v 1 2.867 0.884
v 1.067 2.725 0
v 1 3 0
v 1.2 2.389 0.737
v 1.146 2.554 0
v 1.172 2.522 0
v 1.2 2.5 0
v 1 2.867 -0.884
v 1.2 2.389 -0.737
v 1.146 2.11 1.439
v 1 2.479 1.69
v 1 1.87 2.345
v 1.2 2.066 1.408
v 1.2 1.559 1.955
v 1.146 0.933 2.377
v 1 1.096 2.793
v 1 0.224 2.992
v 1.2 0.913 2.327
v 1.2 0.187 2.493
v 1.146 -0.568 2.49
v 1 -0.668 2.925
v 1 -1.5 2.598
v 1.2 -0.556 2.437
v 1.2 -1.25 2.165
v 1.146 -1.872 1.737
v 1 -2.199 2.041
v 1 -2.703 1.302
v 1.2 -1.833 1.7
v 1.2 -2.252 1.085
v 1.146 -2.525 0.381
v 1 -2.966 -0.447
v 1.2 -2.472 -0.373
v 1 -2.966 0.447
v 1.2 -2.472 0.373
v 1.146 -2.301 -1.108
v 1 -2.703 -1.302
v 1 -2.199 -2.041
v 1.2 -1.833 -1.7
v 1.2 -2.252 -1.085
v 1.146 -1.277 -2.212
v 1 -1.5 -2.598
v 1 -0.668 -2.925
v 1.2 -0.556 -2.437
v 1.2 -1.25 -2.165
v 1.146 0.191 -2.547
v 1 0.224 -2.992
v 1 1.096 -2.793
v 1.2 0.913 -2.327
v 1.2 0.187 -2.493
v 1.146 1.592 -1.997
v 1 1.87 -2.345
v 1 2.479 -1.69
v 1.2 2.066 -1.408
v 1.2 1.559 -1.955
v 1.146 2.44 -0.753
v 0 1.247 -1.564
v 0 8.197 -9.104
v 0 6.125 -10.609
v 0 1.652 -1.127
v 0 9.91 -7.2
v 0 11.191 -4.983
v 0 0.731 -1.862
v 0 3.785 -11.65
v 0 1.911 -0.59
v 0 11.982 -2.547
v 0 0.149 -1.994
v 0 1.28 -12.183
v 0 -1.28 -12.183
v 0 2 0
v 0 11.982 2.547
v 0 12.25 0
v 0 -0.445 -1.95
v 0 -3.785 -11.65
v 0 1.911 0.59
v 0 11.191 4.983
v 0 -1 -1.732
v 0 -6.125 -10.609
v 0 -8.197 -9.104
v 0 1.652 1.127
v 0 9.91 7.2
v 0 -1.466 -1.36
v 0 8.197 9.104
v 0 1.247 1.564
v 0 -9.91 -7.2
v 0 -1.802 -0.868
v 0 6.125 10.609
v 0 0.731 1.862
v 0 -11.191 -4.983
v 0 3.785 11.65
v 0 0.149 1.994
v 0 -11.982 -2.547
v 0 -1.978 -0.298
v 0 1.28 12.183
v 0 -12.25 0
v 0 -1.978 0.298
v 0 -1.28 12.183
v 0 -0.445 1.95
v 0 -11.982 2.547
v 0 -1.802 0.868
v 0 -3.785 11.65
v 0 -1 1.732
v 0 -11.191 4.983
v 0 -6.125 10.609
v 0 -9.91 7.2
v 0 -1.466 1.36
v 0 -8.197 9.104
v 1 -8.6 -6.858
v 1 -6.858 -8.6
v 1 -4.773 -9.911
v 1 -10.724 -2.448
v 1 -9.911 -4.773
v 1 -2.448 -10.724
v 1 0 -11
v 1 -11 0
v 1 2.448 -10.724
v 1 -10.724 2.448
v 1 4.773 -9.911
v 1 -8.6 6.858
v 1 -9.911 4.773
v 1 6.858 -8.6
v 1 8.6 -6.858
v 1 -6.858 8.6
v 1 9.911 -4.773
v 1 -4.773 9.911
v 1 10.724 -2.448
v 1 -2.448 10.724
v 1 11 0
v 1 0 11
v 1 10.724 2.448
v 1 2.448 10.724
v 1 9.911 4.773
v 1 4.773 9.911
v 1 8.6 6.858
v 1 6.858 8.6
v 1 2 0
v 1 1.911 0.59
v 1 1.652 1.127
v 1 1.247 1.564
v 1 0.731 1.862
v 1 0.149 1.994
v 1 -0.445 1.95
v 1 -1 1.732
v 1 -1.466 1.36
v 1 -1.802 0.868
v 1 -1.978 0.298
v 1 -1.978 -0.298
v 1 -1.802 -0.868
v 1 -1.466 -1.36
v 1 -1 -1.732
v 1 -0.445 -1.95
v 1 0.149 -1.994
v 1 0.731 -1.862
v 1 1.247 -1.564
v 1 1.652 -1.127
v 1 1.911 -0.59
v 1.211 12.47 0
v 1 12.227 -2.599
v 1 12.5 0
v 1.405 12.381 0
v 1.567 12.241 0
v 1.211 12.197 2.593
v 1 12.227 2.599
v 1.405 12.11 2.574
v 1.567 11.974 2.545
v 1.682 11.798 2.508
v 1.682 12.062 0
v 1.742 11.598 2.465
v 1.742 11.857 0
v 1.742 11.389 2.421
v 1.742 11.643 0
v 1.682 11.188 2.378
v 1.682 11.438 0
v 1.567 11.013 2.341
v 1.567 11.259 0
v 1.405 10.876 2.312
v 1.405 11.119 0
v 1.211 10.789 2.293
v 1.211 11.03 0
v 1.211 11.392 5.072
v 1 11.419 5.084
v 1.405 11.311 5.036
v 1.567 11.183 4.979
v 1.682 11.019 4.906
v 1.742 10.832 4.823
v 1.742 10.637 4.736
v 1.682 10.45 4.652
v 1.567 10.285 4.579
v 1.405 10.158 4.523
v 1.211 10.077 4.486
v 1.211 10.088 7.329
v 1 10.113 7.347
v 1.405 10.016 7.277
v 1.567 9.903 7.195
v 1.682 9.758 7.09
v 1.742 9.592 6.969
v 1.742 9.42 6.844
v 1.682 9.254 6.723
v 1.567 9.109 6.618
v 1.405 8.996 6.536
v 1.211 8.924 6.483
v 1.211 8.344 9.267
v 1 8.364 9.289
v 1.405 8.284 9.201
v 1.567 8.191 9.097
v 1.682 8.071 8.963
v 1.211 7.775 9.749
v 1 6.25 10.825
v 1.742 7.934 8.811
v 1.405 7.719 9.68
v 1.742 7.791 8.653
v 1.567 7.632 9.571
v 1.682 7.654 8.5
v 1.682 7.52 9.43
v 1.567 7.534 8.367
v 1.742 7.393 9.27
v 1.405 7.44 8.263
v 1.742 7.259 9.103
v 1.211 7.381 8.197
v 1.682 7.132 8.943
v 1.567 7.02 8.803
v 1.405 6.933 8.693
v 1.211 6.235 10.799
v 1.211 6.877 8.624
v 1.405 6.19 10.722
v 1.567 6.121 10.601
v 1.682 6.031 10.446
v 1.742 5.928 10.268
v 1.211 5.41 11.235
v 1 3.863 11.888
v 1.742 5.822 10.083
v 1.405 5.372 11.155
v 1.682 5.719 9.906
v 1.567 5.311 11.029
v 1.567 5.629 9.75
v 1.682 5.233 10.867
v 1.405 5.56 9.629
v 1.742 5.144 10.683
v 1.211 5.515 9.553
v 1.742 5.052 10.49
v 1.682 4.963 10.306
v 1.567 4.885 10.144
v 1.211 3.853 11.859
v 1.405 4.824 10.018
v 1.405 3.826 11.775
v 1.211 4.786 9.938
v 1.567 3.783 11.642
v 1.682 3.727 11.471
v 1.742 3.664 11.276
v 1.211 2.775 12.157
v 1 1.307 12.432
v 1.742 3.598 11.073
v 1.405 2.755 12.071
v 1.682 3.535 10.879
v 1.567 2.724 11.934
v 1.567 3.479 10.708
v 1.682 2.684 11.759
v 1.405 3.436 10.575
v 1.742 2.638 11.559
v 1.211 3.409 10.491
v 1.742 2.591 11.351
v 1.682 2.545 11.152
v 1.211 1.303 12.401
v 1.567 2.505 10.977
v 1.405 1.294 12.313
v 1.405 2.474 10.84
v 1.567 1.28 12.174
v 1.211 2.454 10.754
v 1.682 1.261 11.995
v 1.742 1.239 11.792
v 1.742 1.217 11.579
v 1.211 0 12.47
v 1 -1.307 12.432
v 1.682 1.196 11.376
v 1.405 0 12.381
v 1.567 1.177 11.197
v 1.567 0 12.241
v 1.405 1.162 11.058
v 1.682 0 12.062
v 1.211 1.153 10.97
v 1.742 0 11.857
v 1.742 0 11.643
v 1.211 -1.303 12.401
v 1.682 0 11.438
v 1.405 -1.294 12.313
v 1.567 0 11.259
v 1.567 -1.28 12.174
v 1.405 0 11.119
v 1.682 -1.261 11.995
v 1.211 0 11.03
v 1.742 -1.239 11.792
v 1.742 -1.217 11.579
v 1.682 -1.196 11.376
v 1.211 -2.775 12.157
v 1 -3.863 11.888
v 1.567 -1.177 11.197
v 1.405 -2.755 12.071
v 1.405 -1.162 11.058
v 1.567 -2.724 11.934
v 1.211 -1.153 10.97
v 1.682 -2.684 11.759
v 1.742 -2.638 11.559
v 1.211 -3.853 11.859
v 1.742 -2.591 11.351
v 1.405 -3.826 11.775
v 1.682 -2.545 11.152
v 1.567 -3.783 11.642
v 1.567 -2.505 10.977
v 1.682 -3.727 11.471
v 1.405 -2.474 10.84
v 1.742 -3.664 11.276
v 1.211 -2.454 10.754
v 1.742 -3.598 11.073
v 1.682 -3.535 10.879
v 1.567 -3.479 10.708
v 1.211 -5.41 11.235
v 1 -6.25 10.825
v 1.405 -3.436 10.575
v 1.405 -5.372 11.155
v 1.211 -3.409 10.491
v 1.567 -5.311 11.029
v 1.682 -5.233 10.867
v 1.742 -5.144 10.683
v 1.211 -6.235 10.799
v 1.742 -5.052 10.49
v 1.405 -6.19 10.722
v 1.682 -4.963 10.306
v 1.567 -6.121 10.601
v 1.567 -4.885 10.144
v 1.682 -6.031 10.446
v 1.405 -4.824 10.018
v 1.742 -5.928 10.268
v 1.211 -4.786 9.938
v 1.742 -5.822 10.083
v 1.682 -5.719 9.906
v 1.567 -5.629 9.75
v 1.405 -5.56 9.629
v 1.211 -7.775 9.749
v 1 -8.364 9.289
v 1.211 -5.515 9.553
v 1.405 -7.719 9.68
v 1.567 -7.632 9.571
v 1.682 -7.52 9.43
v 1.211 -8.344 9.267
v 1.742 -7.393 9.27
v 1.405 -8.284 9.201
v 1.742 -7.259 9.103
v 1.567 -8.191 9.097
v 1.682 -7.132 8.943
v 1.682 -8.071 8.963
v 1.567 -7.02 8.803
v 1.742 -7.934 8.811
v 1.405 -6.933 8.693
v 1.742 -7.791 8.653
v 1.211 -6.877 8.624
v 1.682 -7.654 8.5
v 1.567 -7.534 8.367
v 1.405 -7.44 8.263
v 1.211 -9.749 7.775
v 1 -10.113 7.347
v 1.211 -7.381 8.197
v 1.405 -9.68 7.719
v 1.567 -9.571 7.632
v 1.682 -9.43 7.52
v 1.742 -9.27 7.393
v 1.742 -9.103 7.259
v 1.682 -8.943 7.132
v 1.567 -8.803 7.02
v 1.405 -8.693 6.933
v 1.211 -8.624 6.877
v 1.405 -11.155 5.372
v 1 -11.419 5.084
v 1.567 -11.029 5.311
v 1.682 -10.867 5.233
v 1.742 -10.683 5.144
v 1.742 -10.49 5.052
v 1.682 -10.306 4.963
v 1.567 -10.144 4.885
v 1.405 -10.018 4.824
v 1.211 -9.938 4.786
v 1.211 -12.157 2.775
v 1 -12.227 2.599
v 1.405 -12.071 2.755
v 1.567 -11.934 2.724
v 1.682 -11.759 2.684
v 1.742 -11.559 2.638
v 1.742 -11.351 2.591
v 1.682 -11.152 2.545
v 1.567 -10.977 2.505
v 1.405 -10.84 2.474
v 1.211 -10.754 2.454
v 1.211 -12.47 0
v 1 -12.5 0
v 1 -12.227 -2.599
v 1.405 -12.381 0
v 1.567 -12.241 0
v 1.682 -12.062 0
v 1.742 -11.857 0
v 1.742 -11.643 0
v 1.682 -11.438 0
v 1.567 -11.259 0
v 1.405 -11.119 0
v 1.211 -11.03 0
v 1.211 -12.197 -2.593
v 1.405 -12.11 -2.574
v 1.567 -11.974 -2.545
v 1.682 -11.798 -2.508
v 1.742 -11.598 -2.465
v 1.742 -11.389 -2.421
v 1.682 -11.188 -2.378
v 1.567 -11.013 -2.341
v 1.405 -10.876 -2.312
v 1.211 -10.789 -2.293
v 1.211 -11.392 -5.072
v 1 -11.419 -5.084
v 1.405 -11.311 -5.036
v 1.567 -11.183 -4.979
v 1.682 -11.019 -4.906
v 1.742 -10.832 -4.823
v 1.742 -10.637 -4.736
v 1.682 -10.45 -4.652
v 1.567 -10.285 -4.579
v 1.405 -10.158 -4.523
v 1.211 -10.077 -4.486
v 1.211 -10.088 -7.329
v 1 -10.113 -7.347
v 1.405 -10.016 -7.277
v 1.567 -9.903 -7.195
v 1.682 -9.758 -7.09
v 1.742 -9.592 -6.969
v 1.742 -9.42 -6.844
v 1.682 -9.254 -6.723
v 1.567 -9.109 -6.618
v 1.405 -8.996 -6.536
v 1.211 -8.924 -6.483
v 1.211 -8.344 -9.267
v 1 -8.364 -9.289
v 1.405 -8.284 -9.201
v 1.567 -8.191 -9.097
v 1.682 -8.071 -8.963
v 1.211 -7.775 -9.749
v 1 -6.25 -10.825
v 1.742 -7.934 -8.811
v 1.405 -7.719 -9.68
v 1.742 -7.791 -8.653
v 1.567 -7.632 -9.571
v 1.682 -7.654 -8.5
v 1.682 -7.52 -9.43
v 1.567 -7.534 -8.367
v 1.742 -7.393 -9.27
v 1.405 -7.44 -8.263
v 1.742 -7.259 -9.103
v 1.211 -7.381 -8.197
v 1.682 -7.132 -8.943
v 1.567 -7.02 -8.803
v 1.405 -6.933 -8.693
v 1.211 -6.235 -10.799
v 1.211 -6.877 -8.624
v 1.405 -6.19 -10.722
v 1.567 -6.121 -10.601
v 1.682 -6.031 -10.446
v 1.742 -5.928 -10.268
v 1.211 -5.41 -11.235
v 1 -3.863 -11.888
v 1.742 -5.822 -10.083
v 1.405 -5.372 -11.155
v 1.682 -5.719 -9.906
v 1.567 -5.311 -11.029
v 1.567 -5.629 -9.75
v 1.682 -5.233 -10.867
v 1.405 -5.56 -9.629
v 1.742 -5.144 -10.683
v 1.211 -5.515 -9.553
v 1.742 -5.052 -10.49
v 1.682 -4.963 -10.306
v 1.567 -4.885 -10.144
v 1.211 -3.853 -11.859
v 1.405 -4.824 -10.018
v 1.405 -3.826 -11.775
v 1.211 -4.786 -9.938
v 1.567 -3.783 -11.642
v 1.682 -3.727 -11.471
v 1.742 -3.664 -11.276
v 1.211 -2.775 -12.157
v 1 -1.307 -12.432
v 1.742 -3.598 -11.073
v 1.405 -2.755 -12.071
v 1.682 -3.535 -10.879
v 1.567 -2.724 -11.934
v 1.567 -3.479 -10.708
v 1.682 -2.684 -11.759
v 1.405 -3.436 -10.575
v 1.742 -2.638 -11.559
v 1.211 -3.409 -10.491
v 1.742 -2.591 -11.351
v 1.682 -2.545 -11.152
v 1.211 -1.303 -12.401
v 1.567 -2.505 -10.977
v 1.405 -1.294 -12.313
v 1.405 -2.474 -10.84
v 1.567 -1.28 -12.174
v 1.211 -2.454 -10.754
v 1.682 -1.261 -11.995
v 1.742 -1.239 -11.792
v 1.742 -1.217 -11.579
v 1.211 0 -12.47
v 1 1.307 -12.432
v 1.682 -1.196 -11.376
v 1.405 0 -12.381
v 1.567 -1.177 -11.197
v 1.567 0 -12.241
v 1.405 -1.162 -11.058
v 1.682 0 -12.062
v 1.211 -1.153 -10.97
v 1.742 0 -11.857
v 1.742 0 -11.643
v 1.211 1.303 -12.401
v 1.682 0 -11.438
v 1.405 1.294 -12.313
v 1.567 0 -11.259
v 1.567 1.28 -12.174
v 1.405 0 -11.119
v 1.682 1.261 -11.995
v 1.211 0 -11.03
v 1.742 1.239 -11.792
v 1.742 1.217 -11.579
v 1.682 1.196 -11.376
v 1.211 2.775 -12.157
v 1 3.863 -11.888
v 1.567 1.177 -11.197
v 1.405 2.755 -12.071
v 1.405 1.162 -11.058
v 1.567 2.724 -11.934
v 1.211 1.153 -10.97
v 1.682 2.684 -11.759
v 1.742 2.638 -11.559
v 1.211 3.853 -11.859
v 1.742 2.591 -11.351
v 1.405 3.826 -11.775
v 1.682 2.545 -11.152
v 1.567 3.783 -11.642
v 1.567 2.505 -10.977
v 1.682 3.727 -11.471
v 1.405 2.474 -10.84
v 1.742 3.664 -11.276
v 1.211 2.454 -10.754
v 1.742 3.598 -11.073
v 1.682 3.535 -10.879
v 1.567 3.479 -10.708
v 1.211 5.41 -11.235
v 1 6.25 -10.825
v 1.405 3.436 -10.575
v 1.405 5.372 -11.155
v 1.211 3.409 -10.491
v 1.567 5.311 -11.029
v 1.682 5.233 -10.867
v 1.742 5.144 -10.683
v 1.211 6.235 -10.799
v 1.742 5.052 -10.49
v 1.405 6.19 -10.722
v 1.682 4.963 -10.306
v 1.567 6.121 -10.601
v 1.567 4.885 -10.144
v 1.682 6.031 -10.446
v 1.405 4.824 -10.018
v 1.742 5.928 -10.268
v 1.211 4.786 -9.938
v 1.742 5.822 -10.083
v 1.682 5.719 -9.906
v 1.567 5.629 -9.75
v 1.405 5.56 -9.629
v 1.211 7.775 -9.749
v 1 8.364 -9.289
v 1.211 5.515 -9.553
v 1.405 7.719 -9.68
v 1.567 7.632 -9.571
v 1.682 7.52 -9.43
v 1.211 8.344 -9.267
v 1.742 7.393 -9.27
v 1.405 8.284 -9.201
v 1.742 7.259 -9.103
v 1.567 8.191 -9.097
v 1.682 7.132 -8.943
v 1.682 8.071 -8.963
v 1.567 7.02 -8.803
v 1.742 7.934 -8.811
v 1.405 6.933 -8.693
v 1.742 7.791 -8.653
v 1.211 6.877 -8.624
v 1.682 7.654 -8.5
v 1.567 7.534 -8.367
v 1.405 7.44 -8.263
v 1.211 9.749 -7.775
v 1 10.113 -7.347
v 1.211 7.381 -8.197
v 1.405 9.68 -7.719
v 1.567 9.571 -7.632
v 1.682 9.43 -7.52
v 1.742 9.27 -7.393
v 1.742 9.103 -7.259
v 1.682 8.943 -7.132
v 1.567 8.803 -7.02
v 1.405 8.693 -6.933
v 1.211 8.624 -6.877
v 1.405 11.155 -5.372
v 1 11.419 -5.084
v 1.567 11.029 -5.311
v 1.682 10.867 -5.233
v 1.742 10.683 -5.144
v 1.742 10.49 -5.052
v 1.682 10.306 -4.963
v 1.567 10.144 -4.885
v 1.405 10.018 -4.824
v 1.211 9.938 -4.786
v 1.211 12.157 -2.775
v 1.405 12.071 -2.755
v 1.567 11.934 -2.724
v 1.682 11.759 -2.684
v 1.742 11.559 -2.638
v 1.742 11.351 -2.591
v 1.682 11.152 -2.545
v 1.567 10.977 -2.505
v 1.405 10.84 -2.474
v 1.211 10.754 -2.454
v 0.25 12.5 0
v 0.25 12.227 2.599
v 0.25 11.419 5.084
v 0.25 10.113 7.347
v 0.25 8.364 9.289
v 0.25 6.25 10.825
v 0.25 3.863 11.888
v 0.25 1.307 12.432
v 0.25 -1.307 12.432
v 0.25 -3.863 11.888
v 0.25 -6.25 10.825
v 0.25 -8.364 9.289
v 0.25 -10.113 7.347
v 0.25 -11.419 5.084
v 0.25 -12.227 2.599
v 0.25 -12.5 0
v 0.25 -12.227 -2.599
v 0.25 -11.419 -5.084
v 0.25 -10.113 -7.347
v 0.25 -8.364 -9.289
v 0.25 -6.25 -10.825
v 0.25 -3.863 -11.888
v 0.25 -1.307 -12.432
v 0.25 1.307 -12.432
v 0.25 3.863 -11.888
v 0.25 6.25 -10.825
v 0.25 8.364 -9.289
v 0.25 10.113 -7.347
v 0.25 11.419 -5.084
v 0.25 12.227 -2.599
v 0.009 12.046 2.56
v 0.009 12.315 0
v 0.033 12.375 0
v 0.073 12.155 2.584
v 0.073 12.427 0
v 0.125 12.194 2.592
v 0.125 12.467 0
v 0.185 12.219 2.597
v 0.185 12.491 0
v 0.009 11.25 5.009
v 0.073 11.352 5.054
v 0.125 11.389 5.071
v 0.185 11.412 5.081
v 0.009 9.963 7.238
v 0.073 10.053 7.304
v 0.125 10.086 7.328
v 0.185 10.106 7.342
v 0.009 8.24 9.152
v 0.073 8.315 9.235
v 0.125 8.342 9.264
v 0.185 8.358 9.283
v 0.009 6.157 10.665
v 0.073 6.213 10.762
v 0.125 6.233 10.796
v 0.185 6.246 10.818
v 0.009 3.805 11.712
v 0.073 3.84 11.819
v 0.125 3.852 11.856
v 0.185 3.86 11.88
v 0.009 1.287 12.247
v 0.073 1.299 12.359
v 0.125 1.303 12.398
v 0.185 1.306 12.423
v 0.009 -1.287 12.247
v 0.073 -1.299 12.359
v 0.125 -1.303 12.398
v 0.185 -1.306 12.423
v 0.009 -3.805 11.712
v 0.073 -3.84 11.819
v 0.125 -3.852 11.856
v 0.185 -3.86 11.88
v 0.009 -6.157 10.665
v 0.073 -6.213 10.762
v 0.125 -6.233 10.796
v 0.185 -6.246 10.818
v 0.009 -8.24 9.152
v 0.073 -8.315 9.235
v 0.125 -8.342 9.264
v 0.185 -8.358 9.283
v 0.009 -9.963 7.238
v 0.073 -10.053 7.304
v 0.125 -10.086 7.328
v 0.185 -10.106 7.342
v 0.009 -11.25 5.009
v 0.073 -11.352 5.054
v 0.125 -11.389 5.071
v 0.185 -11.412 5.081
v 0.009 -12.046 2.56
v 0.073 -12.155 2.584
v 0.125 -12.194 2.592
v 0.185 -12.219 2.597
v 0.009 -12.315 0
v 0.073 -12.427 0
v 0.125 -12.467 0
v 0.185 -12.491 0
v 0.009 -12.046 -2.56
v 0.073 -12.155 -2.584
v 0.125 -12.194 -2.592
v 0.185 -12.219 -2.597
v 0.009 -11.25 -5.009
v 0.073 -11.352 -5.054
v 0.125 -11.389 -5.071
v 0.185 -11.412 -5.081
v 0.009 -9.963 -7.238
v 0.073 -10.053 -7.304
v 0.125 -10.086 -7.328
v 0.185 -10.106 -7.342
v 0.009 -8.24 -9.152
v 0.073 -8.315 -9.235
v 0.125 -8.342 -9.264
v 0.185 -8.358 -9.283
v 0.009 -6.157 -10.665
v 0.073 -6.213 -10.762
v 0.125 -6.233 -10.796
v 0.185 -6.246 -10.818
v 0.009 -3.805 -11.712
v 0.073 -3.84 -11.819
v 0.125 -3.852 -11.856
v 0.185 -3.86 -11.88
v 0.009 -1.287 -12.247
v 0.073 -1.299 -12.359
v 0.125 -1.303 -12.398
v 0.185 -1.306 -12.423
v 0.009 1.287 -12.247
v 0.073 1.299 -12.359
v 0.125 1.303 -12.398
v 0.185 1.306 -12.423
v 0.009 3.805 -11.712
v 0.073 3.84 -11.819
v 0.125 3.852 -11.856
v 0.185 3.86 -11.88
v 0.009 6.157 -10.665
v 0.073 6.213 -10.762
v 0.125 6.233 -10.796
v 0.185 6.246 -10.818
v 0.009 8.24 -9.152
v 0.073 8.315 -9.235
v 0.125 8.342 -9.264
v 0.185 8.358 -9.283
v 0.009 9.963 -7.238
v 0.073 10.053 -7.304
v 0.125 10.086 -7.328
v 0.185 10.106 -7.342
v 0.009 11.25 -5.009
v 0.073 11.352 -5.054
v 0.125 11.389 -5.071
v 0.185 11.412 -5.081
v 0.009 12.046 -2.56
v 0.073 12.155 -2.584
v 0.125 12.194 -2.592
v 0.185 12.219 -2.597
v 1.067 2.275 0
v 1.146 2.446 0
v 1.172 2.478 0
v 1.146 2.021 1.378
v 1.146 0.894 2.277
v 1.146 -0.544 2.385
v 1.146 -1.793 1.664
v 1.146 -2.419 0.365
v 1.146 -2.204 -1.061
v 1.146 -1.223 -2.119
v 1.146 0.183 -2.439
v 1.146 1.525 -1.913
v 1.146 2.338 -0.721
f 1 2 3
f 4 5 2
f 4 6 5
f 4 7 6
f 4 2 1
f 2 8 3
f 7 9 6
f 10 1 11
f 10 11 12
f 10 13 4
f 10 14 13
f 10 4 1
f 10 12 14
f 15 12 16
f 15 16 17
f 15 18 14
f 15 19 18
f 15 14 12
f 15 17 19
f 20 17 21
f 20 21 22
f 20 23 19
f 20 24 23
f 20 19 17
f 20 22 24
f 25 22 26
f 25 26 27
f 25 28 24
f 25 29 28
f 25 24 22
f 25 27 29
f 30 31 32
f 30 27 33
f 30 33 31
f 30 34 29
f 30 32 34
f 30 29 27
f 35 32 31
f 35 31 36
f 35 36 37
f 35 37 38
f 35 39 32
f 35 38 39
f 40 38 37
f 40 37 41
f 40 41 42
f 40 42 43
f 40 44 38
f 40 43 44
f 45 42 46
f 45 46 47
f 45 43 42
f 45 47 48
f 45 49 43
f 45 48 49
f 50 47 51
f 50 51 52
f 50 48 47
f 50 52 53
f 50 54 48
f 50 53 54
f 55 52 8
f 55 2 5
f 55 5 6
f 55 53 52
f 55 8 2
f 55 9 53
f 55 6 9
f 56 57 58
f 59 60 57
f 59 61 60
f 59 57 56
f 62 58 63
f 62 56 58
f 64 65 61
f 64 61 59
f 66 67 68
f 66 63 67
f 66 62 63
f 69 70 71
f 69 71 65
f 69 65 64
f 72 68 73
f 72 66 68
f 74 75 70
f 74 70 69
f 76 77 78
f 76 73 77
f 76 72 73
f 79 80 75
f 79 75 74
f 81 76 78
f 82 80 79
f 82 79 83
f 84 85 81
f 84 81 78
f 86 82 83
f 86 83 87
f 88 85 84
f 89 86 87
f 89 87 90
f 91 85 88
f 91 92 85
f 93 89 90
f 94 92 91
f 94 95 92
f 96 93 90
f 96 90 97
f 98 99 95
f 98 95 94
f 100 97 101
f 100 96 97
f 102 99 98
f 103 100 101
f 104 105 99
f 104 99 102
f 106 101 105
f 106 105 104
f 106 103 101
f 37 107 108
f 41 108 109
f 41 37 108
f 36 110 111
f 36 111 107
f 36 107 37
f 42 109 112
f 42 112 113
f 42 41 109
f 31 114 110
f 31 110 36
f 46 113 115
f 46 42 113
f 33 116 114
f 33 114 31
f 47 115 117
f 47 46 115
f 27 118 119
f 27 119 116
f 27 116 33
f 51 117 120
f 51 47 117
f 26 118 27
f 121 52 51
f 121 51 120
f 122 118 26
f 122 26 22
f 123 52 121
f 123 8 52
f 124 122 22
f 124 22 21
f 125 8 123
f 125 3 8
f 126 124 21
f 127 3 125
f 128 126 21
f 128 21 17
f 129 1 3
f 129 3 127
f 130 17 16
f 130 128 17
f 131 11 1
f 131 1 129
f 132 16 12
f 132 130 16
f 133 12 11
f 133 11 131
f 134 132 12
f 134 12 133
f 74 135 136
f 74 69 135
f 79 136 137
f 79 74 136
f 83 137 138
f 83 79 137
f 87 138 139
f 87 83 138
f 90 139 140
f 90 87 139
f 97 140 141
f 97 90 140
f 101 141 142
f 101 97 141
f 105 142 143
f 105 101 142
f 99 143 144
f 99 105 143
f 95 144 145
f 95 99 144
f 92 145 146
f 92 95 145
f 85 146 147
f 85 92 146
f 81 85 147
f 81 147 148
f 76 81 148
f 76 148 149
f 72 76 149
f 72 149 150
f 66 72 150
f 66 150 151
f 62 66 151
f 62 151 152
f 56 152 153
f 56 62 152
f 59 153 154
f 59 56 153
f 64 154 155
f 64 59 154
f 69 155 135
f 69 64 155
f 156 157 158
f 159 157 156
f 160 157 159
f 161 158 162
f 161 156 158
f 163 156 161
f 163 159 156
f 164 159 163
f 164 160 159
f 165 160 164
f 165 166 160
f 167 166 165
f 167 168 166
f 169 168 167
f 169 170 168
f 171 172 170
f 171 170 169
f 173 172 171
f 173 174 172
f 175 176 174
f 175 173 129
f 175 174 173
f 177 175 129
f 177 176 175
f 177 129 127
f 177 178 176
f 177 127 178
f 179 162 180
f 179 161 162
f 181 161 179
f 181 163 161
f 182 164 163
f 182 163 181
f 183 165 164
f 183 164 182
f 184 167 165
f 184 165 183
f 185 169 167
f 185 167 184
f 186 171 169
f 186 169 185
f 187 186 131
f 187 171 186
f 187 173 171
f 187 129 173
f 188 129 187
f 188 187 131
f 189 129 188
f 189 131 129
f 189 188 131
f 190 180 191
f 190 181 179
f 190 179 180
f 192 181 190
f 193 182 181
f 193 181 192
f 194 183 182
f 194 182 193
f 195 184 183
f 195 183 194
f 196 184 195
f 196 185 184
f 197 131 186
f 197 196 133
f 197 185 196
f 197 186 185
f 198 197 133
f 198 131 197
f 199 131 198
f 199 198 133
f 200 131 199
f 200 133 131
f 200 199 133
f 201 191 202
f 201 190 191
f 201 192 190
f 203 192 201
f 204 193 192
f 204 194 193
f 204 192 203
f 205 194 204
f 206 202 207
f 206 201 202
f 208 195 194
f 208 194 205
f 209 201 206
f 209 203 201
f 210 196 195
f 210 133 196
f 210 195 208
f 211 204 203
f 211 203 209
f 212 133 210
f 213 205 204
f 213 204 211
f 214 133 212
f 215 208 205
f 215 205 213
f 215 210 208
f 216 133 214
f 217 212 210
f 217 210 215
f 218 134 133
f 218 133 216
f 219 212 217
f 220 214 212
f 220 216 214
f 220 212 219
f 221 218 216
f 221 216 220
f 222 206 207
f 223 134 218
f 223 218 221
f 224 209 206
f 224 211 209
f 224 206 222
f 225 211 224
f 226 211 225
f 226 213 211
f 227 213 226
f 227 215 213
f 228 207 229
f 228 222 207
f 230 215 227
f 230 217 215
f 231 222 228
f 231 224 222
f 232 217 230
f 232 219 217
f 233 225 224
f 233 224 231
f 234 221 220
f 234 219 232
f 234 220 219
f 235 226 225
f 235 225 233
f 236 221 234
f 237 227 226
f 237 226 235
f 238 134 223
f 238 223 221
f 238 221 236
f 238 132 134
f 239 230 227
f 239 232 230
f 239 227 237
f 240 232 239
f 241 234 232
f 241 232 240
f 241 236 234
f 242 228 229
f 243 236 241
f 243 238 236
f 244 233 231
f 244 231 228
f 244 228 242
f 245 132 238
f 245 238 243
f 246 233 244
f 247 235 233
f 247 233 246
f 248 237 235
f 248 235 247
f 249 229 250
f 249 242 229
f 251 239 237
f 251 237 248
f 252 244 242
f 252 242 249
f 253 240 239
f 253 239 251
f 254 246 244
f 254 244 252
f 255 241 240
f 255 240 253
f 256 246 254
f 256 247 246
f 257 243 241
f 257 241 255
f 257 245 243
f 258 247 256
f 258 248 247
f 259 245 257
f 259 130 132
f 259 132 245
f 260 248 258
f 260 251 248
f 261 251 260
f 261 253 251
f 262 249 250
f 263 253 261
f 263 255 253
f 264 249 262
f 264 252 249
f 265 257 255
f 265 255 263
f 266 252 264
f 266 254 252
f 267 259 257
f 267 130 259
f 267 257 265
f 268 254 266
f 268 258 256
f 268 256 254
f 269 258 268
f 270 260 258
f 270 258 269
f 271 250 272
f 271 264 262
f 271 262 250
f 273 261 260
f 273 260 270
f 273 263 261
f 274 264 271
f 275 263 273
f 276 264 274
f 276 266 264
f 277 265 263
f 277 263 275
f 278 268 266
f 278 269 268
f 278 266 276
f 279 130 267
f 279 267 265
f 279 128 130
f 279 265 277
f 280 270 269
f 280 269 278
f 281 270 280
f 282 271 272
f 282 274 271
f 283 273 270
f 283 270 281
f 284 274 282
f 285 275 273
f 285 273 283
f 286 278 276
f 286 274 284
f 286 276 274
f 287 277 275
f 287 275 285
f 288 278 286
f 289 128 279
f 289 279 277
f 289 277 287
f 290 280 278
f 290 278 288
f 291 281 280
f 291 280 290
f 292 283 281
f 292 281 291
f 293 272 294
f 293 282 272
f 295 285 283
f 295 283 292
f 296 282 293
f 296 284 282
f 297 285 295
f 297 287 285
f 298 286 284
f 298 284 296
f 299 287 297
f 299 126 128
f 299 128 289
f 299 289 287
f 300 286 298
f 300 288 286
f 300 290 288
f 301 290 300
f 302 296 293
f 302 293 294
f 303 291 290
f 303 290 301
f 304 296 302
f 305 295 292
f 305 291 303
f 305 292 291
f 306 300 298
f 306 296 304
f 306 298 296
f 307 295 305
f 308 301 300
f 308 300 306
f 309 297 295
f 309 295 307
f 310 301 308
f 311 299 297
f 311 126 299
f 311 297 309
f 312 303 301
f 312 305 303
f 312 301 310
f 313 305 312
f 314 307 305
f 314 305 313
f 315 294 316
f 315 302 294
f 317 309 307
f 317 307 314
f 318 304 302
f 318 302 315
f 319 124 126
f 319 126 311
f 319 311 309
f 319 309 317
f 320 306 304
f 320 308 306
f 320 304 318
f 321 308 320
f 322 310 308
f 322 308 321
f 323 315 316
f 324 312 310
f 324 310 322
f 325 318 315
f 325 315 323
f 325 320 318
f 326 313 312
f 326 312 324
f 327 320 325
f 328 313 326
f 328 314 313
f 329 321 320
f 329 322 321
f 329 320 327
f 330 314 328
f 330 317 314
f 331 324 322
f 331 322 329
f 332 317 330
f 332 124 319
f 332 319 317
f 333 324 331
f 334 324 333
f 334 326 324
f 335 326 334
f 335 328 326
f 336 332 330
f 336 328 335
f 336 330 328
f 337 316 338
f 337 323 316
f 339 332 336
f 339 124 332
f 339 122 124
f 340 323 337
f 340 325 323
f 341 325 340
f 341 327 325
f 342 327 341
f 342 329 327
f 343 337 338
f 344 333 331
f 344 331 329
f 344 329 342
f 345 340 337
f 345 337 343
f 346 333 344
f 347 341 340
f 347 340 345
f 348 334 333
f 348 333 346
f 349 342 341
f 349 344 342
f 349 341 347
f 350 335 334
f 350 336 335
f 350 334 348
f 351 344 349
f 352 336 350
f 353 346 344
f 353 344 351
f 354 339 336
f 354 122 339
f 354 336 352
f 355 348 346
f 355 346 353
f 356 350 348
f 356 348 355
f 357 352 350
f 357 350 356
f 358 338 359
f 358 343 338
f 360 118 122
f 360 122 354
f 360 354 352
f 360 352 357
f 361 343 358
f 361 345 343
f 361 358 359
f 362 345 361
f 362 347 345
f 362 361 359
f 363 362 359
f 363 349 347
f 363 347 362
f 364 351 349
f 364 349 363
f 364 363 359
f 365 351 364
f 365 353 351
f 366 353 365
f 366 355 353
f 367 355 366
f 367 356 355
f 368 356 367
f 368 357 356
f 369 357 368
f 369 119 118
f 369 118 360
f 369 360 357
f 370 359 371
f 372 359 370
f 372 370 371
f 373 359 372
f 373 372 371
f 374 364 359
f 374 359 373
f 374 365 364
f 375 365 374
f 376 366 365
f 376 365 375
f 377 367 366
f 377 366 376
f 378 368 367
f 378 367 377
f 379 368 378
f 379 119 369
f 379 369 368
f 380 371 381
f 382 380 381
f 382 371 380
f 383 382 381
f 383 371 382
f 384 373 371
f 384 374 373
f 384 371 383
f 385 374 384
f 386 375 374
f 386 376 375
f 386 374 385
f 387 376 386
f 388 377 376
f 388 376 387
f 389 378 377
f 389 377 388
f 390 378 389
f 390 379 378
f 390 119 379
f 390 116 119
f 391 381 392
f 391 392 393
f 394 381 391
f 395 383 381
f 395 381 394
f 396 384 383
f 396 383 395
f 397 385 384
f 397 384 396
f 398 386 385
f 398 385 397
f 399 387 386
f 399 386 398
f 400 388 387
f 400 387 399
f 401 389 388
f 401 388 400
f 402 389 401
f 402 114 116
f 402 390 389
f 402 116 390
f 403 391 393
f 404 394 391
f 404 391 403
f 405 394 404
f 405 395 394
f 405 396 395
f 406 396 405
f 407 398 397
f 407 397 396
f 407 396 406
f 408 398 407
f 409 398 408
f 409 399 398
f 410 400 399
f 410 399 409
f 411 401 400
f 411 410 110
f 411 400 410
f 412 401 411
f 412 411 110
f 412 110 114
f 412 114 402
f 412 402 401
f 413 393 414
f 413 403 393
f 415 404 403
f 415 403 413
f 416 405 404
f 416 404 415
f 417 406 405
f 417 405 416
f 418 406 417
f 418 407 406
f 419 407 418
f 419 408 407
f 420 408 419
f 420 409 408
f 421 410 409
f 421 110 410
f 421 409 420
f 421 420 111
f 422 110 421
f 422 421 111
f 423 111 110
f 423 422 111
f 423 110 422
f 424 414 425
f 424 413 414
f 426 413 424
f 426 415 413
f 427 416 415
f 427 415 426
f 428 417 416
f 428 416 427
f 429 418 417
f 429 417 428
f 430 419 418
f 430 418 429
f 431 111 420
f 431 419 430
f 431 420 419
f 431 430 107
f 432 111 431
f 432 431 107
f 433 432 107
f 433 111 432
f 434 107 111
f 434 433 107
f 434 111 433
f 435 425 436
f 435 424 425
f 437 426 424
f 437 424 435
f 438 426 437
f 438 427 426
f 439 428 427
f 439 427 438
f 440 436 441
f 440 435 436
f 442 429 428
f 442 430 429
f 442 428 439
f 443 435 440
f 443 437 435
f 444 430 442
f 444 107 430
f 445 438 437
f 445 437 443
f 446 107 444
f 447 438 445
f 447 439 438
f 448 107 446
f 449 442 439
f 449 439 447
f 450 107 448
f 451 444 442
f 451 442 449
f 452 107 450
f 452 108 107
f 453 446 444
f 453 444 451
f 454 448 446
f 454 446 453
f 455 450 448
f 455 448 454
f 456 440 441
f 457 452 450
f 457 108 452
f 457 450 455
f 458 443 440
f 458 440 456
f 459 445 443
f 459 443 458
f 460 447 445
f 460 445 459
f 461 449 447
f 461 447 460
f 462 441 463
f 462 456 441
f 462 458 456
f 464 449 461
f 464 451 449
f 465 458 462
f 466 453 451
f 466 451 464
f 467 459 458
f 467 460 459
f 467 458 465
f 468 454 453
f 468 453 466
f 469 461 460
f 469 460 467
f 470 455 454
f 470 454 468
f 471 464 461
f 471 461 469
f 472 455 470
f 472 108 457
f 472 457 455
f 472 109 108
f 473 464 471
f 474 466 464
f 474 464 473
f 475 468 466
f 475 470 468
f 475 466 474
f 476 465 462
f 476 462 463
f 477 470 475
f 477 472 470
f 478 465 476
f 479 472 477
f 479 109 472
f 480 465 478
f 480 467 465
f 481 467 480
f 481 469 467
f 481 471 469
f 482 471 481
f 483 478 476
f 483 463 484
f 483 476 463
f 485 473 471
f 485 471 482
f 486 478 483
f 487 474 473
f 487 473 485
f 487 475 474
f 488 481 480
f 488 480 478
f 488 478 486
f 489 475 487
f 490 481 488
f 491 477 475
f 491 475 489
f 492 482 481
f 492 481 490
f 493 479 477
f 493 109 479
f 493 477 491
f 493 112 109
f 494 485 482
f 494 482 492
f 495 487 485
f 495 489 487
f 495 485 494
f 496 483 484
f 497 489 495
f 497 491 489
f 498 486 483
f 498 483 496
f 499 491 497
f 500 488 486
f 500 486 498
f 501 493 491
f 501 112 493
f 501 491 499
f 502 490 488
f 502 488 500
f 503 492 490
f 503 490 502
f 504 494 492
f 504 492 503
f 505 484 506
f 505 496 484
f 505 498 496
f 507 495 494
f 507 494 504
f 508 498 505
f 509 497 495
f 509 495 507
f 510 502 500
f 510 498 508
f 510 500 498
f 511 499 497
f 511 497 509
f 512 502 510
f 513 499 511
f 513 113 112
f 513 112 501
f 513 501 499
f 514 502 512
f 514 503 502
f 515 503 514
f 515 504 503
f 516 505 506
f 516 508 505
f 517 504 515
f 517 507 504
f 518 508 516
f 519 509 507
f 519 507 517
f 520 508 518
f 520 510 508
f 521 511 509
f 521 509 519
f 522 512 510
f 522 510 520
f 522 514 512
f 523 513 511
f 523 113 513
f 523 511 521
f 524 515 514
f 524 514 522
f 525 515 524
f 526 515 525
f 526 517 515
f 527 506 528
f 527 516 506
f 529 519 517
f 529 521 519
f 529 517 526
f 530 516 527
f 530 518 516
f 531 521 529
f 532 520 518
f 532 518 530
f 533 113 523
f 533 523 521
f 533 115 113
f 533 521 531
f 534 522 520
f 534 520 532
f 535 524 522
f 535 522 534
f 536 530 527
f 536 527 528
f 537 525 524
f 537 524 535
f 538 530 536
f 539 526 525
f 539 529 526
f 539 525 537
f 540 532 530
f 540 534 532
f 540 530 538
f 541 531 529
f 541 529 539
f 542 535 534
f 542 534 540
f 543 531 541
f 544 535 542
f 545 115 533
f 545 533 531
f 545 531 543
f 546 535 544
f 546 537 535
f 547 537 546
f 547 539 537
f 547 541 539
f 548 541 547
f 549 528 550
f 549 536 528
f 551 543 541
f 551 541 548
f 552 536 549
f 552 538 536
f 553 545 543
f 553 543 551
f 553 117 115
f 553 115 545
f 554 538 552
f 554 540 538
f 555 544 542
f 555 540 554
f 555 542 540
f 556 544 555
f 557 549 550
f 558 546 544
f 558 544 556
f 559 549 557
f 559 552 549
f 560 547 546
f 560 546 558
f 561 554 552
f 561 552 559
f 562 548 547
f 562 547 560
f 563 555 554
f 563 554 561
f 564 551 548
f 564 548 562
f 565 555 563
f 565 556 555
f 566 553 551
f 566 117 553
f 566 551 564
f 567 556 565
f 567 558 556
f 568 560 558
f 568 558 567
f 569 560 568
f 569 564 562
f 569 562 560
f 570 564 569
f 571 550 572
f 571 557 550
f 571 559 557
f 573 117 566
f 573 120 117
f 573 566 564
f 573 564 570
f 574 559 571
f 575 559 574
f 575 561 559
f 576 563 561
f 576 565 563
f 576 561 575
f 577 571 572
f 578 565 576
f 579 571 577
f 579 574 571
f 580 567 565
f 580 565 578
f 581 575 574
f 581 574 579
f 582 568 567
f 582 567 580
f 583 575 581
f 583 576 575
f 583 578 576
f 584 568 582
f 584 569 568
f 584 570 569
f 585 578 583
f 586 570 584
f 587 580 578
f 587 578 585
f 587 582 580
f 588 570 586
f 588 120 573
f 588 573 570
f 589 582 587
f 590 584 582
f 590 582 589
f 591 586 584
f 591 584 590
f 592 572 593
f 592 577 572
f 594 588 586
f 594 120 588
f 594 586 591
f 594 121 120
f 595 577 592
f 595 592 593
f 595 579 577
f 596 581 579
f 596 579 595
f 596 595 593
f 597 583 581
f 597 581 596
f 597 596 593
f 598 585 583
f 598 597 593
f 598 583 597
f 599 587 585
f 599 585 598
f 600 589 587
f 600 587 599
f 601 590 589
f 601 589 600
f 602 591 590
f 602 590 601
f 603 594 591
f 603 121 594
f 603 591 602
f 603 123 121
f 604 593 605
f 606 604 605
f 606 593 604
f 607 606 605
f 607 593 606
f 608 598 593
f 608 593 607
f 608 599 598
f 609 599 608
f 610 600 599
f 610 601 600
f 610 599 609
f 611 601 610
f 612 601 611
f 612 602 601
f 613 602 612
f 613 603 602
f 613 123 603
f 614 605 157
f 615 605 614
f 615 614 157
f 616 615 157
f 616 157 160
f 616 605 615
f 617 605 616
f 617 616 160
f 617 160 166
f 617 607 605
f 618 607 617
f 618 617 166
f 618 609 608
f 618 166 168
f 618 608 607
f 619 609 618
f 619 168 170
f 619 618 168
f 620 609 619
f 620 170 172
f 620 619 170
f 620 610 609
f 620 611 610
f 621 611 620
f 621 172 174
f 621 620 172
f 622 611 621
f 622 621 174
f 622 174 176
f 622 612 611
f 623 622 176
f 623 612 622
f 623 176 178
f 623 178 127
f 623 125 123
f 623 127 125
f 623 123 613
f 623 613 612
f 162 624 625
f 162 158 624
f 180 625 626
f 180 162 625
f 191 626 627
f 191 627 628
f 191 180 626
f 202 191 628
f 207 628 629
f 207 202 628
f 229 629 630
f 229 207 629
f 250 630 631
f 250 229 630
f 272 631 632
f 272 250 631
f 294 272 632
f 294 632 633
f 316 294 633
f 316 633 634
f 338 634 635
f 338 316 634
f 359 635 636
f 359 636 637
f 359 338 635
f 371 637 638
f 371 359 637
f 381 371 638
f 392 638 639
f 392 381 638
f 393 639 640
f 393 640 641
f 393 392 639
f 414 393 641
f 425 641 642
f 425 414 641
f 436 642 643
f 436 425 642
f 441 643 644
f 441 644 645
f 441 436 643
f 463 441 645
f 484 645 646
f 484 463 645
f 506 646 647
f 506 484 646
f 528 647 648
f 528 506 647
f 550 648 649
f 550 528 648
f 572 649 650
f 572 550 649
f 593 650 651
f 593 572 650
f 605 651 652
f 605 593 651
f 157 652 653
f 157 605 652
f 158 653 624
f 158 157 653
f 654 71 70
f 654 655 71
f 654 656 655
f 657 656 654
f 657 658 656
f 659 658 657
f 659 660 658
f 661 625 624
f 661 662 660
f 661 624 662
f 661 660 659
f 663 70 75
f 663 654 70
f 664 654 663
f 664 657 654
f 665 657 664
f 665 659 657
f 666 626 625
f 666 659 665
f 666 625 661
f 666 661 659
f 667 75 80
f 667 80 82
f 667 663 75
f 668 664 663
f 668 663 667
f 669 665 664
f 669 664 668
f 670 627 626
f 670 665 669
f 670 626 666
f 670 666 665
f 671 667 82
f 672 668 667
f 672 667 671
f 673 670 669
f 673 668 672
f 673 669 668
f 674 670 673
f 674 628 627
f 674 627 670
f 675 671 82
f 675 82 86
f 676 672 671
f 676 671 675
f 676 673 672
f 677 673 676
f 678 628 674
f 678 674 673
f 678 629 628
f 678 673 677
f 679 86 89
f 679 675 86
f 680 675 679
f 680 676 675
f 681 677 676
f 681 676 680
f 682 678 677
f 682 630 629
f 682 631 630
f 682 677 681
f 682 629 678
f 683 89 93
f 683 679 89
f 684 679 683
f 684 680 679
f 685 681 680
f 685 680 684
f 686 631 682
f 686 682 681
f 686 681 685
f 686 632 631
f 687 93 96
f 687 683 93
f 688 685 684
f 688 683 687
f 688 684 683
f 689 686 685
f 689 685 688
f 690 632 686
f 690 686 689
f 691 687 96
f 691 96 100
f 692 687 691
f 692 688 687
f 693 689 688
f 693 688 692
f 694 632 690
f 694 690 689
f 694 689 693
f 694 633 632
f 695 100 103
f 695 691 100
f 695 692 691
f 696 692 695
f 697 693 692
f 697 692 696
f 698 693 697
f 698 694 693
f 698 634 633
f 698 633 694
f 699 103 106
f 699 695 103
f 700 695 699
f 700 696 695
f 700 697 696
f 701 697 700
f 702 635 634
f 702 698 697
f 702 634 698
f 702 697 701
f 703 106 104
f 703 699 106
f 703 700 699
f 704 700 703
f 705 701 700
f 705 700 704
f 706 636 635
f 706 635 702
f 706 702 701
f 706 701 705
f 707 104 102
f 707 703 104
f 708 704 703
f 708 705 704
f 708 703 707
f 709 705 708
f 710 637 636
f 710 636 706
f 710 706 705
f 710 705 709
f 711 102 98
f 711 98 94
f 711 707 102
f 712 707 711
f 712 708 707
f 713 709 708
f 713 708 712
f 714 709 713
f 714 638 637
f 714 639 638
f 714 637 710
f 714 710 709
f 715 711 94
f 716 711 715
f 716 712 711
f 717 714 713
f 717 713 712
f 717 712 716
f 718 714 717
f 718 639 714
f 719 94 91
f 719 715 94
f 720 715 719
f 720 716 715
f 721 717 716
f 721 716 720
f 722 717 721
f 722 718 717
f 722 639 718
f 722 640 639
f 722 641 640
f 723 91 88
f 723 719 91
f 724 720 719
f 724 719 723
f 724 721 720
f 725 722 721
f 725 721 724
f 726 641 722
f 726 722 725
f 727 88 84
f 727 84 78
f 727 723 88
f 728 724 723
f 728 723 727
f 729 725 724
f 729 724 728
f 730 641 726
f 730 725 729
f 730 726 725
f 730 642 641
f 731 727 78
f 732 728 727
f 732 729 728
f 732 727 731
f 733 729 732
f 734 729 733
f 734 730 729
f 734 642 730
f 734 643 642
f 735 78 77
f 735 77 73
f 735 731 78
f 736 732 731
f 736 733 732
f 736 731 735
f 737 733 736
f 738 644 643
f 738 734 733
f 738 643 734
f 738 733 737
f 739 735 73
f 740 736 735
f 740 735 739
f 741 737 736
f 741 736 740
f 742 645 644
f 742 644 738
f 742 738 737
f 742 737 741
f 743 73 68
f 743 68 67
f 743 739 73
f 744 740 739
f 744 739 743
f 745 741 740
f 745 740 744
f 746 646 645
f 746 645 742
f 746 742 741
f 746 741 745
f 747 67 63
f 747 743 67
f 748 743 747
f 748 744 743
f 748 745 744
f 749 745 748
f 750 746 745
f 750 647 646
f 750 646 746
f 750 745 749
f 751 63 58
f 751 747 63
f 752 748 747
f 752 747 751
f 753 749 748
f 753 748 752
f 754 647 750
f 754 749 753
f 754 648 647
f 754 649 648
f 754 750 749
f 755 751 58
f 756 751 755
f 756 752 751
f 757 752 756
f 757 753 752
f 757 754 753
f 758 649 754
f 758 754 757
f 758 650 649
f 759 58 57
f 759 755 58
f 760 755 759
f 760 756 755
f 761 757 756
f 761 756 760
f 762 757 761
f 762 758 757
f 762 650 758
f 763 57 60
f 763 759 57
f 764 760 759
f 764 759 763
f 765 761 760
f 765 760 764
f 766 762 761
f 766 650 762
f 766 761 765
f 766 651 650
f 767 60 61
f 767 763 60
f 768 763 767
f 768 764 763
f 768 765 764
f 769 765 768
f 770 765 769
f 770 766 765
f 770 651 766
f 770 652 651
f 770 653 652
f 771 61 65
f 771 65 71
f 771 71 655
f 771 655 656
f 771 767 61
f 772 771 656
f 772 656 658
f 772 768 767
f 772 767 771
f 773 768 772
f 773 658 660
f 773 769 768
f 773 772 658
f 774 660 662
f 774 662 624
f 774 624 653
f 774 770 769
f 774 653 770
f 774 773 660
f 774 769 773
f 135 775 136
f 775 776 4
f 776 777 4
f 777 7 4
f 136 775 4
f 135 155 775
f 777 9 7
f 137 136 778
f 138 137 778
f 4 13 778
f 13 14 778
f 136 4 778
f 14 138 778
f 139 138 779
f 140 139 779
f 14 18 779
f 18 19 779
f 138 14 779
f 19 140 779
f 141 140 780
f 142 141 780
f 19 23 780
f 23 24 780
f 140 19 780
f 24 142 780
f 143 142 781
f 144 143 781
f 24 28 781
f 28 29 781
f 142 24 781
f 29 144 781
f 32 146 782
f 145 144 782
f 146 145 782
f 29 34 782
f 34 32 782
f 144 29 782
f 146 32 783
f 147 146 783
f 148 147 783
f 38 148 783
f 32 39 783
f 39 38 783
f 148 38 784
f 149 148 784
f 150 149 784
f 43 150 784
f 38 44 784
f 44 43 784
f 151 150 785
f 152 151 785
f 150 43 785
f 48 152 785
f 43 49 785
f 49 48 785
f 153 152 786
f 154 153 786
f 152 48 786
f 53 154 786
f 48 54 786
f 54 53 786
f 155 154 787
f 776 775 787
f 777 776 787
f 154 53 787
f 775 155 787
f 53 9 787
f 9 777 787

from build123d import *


with BuildPart() as part:
    # Sketch1 → Revolve1 (revolve)
    with BuildSketch(Plane(origin=(0, 0, 0), x_dir=(-1, 0, 0), z_dir=(0, 0, -1))):
        with BuildLine():
            Line((-1, 11), (-1, 3))
            add(Edge.make_bspline(
                [(-1, 3), (-1.078203591, 2.575668755), (-1.2, 2.5)],
                knots=[0, 0, 0, 0.432994338, 0.432994338, 0.432994338], degree=2))
            add(Edge.make_bspline(
                [(-1, 2), (-1.078203591, 2.424331245), (-1.2, 2.5)],
                knots=[0, 0, 0, 0.432994338, 0.432994338, 0.432994338], degree=2))
            Line((-1, 2), (0, 2))
            Line((0, 2), (0, 12.25))
            ThreePointArc((0, 12.25), (-0.073223305, 12.426776695), (-0.25, 12.5))
            Line((-0.25, 12.5), (-1, 12.5))
            ThreePointArc((-1, 12.5), (-1.75, 11.75), (-1, 11))
        make_face()
    revolve(axis=Axis((-1.443304251, 0, 0), (1, 0, 0)))


solid = part.part
